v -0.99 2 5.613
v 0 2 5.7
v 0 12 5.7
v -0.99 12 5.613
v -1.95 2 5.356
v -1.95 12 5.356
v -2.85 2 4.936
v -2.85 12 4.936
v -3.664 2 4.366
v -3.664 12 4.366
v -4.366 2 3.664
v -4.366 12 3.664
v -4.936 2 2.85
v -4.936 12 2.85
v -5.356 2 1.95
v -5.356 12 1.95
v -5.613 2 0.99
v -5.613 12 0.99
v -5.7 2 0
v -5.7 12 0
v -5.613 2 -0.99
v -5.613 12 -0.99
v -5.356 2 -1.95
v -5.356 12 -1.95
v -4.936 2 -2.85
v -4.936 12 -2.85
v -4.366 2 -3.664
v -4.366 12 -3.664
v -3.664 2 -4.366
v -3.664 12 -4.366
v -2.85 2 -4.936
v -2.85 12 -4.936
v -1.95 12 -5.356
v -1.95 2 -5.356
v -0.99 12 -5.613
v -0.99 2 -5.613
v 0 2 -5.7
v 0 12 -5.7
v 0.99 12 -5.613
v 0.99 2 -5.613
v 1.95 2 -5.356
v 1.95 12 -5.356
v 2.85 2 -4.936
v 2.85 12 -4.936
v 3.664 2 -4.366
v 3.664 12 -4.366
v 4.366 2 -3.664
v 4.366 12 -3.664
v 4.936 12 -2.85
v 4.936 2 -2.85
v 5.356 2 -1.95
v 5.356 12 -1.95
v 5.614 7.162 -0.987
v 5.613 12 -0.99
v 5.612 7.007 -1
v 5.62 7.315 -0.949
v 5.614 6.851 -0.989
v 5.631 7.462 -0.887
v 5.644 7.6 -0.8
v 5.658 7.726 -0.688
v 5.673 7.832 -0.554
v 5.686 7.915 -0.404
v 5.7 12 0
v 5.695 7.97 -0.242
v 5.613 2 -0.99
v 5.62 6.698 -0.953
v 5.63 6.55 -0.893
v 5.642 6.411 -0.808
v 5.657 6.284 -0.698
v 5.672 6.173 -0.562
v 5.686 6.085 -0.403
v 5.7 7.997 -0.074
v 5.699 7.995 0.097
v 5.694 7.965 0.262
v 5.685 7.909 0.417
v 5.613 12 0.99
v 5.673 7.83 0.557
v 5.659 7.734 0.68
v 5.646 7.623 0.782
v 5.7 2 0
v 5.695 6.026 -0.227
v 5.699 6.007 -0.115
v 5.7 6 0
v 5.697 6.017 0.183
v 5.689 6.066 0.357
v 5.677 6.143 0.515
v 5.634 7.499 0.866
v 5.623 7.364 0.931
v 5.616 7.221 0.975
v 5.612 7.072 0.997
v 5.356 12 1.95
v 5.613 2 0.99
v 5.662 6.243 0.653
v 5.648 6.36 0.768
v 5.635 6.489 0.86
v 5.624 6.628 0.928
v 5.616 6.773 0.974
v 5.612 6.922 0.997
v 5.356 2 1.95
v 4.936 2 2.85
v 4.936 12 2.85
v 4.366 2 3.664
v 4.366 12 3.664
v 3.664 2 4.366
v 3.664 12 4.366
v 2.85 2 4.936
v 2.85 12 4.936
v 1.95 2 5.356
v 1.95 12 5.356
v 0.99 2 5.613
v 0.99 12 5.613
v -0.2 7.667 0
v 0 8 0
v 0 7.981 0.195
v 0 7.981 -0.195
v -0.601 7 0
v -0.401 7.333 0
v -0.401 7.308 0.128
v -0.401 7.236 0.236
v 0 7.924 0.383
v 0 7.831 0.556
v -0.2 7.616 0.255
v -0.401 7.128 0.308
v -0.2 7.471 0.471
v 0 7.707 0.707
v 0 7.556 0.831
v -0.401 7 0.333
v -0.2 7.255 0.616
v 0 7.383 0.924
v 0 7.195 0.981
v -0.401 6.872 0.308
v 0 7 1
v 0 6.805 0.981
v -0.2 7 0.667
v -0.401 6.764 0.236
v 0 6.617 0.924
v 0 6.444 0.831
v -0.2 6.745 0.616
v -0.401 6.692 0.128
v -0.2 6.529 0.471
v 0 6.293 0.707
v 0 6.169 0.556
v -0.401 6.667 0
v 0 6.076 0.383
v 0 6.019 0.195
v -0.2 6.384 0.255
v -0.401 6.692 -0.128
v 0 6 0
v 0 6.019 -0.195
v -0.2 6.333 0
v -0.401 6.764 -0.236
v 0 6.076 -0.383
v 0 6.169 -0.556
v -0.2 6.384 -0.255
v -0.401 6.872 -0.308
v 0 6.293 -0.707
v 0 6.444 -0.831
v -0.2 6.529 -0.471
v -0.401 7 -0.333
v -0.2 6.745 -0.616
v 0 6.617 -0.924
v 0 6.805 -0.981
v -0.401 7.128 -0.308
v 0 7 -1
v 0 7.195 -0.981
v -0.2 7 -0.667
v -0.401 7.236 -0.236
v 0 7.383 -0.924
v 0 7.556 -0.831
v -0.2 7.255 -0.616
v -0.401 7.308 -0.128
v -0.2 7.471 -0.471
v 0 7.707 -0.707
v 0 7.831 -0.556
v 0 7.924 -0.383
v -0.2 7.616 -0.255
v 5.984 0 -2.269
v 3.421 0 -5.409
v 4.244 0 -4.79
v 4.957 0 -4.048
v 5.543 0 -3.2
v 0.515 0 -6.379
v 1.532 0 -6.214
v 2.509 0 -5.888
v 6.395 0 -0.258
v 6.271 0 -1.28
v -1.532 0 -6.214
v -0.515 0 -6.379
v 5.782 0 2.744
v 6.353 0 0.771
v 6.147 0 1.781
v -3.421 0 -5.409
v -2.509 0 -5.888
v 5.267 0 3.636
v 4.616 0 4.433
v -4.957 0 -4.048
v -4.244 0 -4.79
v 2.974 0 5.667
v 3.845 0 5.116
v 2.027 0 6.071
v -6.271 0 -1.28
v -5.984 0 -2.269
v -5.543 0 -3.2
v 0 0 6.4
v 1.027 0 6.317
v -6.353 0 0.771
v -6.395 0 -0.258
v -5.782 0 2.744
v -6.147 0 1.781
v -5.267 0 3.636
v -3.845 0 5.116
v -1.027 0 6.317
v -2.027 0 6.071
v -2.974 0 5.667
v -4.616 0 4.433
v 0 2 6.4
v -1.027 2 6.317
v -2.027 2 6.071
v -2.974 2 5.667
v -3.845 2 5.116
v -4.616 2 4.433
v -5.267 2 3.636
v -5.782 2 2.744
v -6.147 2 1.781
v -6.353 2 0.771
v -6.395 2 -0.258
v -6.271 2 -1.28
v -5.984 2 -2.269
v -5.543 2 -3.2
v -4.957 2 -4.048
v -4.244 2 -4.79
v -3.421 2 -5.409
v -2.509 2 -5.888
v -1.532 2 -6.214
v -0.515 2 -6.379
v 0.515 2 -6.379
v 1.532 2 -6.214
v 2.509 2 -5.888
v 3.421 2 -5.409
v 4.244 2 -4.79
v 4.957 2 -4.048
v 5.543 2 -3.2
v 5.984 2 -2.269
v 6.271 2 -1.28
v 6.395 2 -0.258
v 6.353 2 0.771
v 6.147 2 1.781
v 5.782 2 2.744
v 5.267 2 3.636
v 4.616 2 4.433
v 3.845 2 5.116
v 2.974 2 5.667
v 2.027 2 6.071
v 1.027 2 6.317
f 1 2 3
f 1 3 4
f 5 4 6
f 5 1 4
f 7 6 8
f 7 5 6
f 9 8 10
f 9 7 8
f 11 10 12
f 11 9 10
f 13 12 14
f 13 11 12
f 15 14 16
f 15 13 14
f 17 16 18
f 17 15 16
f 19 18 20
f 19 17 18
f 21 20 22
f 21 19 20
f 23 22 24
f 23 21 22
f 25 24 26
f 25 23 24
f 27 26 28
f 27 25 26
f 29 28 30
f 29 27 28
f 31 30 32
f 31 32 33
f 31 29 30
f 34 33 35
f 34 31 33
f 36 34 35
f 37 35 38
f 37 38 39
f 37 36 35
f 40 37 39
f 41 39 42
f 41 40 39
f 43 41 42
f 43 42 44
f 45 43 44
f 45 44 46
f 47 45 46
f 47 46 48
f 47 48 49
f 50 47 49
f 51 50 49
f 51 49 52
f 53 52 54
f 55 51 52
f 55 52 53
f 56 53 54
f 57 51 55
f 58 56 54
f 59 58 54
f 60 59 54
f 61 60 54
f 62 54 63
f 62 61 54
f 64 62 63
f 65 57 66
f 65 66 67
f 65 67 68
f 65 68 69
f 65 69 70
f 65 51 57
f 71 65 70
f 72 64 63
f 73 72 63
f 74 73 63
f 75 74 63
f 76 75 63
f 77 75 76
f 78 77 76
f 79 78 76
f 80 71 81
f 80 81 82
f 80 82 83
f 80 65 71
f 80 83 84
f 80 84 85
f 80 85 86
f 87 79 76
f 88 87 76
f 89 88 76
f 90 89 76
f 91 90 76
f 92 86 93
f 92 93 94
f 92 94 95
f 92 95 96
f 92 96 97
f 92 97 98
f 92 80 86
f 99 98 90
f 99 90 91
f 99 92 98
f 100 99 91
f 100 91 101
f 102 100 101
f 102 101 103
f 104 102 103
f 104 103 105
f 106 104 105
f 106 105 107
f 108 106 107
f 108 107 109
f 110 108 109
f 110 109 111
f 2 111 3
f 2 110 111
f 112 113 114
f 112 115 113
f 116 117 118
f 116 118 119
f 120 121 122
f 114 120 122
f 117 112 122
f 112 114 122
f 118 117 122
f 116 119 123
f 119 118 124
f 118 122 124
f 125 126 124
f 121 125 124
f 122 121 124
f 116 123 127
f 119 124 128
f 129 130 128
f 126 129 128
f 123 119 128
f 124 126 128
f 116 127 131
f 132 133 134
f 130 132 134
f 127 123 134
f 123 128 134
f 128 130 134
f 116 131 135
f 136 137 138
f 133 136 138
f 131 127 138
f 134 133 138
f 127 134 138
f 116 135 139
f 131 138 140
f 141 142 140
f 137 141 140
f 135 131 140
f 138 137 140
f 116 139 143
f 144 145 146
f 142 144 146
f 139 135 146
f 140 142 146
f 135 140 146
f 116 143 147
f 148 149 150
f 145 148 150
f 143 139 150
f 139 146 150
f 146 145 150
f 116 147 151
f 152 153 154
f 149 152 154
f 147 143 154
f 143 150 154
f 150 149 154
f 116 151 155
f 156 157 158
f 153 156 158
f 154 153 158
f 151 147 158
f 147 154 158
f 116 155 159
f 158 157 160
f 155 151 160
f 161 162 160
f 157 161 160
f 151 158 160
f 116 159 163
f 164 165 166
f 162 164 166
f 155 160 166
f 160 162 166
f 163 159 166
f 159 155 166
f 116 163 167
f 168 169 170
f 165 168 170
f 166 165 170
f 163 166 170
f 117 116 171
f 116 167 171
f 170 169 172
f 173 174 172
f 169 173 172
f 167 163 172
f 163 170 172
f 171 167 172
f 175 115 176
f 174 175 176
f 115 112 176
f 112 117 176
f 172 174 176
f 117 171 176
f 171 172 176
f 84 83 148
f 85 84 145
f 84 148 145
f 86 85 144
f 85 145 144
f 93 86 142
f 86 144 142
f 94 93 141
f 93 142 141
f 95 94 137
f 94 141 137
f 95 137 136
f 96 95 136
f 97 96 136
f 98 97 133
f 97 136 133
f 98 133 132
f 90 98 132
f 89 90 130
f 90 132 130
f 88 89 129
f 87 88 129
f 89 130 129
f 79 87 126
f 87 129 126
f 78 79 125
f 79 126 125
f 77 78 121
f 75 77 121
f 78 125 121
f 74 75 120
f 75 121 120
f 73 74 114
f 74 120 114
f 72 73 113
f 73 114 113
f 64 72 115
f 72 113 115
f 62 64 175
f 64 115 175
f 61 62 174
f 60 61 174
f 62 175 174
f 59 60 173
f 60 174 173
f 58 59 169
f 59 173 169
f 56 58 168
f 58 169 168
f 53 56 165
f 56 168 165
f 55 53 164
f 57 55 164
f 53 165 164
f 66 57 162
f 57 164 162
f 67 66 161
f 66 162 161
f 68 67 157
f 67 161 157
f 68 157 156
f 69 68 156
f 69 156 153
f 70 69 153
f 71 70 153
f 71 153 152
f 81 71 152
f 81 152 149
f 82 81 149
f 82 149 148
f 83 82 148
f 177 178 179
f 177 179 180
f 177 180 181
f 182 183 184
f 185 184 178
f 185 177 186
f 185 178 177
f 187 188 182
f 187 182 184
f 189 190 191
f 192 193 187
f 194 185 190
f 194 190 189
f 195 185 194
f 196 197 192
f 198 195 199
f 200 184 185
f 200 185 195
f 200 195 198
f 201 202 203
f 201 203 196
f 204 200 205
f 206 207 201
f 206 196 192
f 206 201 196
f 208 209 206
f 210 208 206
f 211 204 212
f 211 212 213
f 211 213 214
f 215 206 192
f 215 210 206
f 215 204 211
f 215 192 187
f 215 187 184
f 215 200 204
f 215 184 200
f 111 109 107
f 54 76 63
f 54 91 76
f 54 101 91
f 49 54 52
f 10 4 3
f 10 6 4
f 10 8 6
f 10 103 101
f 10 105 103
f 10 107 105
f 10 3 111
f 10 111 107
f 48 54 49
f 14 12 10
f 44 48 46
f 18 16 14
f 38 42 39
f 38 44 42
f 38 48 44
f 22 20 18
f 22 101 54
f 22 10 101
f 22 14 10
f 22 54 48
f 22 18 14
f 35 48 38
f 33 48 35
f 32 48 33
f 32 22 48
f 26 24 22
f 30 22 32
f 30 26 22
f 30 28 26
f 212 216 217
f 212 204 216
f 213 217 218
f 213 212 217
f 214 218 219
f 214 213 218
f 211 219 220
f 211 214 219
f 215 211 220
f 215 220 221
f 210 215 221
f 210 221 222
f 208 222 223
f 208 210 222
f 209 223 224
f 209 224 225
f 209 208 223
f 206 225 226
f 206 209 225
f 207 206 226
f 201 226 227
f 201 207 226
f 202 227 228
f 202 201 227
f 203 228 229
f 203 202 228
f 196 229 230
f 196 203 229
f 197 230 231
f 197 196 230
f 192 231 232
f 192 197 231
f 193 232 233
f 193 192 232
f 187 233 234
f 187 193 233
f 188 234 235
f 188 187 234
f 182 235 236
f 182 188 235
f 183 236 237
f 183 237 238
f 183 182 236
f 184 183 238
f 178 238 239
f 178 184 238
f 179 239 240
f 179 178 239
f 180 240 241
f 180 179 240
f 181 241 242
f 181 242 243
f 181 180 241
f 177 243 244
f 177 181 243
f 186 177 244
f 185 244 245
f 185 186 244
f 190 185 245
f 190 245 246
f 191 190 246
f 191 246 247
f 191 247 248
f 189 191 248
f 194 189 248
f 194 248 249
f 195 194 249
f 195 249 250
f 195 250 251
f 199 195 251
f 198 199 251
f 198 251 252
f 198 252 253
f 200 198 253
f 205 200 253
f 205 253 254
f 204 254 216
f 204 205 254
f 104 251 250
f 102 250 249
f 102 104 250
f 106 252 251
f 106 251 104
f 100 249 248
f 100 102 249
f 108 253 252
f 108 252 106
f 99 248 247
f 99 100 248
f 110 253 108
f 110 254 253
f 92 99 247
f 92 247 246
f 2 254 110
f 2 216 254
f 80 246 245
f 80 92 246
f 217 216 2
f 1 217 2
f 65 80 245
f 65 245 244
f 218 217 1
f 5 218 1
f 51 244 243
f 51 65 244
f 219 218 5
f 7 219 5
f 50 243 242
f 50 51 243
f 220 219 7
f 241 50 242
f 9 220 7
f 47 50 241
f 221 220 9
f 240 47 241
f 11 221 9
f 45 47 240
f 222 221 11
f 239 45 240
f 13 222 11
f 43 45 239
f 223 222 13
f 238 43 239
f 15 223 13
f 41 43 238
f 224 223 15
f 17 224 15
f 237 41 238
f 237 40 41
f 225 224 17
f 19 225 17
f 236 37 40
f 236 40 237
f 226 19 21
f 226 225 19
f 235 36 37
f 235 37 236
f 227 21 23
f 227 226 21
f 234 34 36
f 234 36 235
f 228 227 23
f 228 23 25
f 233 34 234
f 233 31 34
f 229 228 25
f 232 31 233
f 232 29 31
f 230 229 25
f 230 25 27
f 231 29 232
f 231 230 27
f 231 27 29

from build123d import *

# Parameters (mm, degrees)
F6_D     = 2
F6_DEPTH = 5.7
F6_TIP   = 0.600860619


# Not quite as in the source:
# - a feature names something its author has since deleted; it is built from what else it names


with BuildPart() as f3:
    # F2 (on Right) → F3 (revolve)
    with BuildSketch(Plane.YZ):
        Polygon((0, 0), (12, 0), (12, 5.7), (2, 5.7), (2, 6.4), (0, 6.4), align=None)
    revolve(axis=Axis((0, 5.7350749573, 0), (0, -1, 0)))

    # F6
    with Locations(Plane.YZ.offset(5.7)):
        with Locations((7, 0)):
            Hole(F6_D / 2, depth=F6_DEPTH)
            with Locations((0, 0, -(F6_DEPTH + F6_TIP / 2))):  # 118° drill point
                Cone(0, F6_D / 2, F6_TIP, mode=Mode.SUBTRACT)


solid = f3.part
